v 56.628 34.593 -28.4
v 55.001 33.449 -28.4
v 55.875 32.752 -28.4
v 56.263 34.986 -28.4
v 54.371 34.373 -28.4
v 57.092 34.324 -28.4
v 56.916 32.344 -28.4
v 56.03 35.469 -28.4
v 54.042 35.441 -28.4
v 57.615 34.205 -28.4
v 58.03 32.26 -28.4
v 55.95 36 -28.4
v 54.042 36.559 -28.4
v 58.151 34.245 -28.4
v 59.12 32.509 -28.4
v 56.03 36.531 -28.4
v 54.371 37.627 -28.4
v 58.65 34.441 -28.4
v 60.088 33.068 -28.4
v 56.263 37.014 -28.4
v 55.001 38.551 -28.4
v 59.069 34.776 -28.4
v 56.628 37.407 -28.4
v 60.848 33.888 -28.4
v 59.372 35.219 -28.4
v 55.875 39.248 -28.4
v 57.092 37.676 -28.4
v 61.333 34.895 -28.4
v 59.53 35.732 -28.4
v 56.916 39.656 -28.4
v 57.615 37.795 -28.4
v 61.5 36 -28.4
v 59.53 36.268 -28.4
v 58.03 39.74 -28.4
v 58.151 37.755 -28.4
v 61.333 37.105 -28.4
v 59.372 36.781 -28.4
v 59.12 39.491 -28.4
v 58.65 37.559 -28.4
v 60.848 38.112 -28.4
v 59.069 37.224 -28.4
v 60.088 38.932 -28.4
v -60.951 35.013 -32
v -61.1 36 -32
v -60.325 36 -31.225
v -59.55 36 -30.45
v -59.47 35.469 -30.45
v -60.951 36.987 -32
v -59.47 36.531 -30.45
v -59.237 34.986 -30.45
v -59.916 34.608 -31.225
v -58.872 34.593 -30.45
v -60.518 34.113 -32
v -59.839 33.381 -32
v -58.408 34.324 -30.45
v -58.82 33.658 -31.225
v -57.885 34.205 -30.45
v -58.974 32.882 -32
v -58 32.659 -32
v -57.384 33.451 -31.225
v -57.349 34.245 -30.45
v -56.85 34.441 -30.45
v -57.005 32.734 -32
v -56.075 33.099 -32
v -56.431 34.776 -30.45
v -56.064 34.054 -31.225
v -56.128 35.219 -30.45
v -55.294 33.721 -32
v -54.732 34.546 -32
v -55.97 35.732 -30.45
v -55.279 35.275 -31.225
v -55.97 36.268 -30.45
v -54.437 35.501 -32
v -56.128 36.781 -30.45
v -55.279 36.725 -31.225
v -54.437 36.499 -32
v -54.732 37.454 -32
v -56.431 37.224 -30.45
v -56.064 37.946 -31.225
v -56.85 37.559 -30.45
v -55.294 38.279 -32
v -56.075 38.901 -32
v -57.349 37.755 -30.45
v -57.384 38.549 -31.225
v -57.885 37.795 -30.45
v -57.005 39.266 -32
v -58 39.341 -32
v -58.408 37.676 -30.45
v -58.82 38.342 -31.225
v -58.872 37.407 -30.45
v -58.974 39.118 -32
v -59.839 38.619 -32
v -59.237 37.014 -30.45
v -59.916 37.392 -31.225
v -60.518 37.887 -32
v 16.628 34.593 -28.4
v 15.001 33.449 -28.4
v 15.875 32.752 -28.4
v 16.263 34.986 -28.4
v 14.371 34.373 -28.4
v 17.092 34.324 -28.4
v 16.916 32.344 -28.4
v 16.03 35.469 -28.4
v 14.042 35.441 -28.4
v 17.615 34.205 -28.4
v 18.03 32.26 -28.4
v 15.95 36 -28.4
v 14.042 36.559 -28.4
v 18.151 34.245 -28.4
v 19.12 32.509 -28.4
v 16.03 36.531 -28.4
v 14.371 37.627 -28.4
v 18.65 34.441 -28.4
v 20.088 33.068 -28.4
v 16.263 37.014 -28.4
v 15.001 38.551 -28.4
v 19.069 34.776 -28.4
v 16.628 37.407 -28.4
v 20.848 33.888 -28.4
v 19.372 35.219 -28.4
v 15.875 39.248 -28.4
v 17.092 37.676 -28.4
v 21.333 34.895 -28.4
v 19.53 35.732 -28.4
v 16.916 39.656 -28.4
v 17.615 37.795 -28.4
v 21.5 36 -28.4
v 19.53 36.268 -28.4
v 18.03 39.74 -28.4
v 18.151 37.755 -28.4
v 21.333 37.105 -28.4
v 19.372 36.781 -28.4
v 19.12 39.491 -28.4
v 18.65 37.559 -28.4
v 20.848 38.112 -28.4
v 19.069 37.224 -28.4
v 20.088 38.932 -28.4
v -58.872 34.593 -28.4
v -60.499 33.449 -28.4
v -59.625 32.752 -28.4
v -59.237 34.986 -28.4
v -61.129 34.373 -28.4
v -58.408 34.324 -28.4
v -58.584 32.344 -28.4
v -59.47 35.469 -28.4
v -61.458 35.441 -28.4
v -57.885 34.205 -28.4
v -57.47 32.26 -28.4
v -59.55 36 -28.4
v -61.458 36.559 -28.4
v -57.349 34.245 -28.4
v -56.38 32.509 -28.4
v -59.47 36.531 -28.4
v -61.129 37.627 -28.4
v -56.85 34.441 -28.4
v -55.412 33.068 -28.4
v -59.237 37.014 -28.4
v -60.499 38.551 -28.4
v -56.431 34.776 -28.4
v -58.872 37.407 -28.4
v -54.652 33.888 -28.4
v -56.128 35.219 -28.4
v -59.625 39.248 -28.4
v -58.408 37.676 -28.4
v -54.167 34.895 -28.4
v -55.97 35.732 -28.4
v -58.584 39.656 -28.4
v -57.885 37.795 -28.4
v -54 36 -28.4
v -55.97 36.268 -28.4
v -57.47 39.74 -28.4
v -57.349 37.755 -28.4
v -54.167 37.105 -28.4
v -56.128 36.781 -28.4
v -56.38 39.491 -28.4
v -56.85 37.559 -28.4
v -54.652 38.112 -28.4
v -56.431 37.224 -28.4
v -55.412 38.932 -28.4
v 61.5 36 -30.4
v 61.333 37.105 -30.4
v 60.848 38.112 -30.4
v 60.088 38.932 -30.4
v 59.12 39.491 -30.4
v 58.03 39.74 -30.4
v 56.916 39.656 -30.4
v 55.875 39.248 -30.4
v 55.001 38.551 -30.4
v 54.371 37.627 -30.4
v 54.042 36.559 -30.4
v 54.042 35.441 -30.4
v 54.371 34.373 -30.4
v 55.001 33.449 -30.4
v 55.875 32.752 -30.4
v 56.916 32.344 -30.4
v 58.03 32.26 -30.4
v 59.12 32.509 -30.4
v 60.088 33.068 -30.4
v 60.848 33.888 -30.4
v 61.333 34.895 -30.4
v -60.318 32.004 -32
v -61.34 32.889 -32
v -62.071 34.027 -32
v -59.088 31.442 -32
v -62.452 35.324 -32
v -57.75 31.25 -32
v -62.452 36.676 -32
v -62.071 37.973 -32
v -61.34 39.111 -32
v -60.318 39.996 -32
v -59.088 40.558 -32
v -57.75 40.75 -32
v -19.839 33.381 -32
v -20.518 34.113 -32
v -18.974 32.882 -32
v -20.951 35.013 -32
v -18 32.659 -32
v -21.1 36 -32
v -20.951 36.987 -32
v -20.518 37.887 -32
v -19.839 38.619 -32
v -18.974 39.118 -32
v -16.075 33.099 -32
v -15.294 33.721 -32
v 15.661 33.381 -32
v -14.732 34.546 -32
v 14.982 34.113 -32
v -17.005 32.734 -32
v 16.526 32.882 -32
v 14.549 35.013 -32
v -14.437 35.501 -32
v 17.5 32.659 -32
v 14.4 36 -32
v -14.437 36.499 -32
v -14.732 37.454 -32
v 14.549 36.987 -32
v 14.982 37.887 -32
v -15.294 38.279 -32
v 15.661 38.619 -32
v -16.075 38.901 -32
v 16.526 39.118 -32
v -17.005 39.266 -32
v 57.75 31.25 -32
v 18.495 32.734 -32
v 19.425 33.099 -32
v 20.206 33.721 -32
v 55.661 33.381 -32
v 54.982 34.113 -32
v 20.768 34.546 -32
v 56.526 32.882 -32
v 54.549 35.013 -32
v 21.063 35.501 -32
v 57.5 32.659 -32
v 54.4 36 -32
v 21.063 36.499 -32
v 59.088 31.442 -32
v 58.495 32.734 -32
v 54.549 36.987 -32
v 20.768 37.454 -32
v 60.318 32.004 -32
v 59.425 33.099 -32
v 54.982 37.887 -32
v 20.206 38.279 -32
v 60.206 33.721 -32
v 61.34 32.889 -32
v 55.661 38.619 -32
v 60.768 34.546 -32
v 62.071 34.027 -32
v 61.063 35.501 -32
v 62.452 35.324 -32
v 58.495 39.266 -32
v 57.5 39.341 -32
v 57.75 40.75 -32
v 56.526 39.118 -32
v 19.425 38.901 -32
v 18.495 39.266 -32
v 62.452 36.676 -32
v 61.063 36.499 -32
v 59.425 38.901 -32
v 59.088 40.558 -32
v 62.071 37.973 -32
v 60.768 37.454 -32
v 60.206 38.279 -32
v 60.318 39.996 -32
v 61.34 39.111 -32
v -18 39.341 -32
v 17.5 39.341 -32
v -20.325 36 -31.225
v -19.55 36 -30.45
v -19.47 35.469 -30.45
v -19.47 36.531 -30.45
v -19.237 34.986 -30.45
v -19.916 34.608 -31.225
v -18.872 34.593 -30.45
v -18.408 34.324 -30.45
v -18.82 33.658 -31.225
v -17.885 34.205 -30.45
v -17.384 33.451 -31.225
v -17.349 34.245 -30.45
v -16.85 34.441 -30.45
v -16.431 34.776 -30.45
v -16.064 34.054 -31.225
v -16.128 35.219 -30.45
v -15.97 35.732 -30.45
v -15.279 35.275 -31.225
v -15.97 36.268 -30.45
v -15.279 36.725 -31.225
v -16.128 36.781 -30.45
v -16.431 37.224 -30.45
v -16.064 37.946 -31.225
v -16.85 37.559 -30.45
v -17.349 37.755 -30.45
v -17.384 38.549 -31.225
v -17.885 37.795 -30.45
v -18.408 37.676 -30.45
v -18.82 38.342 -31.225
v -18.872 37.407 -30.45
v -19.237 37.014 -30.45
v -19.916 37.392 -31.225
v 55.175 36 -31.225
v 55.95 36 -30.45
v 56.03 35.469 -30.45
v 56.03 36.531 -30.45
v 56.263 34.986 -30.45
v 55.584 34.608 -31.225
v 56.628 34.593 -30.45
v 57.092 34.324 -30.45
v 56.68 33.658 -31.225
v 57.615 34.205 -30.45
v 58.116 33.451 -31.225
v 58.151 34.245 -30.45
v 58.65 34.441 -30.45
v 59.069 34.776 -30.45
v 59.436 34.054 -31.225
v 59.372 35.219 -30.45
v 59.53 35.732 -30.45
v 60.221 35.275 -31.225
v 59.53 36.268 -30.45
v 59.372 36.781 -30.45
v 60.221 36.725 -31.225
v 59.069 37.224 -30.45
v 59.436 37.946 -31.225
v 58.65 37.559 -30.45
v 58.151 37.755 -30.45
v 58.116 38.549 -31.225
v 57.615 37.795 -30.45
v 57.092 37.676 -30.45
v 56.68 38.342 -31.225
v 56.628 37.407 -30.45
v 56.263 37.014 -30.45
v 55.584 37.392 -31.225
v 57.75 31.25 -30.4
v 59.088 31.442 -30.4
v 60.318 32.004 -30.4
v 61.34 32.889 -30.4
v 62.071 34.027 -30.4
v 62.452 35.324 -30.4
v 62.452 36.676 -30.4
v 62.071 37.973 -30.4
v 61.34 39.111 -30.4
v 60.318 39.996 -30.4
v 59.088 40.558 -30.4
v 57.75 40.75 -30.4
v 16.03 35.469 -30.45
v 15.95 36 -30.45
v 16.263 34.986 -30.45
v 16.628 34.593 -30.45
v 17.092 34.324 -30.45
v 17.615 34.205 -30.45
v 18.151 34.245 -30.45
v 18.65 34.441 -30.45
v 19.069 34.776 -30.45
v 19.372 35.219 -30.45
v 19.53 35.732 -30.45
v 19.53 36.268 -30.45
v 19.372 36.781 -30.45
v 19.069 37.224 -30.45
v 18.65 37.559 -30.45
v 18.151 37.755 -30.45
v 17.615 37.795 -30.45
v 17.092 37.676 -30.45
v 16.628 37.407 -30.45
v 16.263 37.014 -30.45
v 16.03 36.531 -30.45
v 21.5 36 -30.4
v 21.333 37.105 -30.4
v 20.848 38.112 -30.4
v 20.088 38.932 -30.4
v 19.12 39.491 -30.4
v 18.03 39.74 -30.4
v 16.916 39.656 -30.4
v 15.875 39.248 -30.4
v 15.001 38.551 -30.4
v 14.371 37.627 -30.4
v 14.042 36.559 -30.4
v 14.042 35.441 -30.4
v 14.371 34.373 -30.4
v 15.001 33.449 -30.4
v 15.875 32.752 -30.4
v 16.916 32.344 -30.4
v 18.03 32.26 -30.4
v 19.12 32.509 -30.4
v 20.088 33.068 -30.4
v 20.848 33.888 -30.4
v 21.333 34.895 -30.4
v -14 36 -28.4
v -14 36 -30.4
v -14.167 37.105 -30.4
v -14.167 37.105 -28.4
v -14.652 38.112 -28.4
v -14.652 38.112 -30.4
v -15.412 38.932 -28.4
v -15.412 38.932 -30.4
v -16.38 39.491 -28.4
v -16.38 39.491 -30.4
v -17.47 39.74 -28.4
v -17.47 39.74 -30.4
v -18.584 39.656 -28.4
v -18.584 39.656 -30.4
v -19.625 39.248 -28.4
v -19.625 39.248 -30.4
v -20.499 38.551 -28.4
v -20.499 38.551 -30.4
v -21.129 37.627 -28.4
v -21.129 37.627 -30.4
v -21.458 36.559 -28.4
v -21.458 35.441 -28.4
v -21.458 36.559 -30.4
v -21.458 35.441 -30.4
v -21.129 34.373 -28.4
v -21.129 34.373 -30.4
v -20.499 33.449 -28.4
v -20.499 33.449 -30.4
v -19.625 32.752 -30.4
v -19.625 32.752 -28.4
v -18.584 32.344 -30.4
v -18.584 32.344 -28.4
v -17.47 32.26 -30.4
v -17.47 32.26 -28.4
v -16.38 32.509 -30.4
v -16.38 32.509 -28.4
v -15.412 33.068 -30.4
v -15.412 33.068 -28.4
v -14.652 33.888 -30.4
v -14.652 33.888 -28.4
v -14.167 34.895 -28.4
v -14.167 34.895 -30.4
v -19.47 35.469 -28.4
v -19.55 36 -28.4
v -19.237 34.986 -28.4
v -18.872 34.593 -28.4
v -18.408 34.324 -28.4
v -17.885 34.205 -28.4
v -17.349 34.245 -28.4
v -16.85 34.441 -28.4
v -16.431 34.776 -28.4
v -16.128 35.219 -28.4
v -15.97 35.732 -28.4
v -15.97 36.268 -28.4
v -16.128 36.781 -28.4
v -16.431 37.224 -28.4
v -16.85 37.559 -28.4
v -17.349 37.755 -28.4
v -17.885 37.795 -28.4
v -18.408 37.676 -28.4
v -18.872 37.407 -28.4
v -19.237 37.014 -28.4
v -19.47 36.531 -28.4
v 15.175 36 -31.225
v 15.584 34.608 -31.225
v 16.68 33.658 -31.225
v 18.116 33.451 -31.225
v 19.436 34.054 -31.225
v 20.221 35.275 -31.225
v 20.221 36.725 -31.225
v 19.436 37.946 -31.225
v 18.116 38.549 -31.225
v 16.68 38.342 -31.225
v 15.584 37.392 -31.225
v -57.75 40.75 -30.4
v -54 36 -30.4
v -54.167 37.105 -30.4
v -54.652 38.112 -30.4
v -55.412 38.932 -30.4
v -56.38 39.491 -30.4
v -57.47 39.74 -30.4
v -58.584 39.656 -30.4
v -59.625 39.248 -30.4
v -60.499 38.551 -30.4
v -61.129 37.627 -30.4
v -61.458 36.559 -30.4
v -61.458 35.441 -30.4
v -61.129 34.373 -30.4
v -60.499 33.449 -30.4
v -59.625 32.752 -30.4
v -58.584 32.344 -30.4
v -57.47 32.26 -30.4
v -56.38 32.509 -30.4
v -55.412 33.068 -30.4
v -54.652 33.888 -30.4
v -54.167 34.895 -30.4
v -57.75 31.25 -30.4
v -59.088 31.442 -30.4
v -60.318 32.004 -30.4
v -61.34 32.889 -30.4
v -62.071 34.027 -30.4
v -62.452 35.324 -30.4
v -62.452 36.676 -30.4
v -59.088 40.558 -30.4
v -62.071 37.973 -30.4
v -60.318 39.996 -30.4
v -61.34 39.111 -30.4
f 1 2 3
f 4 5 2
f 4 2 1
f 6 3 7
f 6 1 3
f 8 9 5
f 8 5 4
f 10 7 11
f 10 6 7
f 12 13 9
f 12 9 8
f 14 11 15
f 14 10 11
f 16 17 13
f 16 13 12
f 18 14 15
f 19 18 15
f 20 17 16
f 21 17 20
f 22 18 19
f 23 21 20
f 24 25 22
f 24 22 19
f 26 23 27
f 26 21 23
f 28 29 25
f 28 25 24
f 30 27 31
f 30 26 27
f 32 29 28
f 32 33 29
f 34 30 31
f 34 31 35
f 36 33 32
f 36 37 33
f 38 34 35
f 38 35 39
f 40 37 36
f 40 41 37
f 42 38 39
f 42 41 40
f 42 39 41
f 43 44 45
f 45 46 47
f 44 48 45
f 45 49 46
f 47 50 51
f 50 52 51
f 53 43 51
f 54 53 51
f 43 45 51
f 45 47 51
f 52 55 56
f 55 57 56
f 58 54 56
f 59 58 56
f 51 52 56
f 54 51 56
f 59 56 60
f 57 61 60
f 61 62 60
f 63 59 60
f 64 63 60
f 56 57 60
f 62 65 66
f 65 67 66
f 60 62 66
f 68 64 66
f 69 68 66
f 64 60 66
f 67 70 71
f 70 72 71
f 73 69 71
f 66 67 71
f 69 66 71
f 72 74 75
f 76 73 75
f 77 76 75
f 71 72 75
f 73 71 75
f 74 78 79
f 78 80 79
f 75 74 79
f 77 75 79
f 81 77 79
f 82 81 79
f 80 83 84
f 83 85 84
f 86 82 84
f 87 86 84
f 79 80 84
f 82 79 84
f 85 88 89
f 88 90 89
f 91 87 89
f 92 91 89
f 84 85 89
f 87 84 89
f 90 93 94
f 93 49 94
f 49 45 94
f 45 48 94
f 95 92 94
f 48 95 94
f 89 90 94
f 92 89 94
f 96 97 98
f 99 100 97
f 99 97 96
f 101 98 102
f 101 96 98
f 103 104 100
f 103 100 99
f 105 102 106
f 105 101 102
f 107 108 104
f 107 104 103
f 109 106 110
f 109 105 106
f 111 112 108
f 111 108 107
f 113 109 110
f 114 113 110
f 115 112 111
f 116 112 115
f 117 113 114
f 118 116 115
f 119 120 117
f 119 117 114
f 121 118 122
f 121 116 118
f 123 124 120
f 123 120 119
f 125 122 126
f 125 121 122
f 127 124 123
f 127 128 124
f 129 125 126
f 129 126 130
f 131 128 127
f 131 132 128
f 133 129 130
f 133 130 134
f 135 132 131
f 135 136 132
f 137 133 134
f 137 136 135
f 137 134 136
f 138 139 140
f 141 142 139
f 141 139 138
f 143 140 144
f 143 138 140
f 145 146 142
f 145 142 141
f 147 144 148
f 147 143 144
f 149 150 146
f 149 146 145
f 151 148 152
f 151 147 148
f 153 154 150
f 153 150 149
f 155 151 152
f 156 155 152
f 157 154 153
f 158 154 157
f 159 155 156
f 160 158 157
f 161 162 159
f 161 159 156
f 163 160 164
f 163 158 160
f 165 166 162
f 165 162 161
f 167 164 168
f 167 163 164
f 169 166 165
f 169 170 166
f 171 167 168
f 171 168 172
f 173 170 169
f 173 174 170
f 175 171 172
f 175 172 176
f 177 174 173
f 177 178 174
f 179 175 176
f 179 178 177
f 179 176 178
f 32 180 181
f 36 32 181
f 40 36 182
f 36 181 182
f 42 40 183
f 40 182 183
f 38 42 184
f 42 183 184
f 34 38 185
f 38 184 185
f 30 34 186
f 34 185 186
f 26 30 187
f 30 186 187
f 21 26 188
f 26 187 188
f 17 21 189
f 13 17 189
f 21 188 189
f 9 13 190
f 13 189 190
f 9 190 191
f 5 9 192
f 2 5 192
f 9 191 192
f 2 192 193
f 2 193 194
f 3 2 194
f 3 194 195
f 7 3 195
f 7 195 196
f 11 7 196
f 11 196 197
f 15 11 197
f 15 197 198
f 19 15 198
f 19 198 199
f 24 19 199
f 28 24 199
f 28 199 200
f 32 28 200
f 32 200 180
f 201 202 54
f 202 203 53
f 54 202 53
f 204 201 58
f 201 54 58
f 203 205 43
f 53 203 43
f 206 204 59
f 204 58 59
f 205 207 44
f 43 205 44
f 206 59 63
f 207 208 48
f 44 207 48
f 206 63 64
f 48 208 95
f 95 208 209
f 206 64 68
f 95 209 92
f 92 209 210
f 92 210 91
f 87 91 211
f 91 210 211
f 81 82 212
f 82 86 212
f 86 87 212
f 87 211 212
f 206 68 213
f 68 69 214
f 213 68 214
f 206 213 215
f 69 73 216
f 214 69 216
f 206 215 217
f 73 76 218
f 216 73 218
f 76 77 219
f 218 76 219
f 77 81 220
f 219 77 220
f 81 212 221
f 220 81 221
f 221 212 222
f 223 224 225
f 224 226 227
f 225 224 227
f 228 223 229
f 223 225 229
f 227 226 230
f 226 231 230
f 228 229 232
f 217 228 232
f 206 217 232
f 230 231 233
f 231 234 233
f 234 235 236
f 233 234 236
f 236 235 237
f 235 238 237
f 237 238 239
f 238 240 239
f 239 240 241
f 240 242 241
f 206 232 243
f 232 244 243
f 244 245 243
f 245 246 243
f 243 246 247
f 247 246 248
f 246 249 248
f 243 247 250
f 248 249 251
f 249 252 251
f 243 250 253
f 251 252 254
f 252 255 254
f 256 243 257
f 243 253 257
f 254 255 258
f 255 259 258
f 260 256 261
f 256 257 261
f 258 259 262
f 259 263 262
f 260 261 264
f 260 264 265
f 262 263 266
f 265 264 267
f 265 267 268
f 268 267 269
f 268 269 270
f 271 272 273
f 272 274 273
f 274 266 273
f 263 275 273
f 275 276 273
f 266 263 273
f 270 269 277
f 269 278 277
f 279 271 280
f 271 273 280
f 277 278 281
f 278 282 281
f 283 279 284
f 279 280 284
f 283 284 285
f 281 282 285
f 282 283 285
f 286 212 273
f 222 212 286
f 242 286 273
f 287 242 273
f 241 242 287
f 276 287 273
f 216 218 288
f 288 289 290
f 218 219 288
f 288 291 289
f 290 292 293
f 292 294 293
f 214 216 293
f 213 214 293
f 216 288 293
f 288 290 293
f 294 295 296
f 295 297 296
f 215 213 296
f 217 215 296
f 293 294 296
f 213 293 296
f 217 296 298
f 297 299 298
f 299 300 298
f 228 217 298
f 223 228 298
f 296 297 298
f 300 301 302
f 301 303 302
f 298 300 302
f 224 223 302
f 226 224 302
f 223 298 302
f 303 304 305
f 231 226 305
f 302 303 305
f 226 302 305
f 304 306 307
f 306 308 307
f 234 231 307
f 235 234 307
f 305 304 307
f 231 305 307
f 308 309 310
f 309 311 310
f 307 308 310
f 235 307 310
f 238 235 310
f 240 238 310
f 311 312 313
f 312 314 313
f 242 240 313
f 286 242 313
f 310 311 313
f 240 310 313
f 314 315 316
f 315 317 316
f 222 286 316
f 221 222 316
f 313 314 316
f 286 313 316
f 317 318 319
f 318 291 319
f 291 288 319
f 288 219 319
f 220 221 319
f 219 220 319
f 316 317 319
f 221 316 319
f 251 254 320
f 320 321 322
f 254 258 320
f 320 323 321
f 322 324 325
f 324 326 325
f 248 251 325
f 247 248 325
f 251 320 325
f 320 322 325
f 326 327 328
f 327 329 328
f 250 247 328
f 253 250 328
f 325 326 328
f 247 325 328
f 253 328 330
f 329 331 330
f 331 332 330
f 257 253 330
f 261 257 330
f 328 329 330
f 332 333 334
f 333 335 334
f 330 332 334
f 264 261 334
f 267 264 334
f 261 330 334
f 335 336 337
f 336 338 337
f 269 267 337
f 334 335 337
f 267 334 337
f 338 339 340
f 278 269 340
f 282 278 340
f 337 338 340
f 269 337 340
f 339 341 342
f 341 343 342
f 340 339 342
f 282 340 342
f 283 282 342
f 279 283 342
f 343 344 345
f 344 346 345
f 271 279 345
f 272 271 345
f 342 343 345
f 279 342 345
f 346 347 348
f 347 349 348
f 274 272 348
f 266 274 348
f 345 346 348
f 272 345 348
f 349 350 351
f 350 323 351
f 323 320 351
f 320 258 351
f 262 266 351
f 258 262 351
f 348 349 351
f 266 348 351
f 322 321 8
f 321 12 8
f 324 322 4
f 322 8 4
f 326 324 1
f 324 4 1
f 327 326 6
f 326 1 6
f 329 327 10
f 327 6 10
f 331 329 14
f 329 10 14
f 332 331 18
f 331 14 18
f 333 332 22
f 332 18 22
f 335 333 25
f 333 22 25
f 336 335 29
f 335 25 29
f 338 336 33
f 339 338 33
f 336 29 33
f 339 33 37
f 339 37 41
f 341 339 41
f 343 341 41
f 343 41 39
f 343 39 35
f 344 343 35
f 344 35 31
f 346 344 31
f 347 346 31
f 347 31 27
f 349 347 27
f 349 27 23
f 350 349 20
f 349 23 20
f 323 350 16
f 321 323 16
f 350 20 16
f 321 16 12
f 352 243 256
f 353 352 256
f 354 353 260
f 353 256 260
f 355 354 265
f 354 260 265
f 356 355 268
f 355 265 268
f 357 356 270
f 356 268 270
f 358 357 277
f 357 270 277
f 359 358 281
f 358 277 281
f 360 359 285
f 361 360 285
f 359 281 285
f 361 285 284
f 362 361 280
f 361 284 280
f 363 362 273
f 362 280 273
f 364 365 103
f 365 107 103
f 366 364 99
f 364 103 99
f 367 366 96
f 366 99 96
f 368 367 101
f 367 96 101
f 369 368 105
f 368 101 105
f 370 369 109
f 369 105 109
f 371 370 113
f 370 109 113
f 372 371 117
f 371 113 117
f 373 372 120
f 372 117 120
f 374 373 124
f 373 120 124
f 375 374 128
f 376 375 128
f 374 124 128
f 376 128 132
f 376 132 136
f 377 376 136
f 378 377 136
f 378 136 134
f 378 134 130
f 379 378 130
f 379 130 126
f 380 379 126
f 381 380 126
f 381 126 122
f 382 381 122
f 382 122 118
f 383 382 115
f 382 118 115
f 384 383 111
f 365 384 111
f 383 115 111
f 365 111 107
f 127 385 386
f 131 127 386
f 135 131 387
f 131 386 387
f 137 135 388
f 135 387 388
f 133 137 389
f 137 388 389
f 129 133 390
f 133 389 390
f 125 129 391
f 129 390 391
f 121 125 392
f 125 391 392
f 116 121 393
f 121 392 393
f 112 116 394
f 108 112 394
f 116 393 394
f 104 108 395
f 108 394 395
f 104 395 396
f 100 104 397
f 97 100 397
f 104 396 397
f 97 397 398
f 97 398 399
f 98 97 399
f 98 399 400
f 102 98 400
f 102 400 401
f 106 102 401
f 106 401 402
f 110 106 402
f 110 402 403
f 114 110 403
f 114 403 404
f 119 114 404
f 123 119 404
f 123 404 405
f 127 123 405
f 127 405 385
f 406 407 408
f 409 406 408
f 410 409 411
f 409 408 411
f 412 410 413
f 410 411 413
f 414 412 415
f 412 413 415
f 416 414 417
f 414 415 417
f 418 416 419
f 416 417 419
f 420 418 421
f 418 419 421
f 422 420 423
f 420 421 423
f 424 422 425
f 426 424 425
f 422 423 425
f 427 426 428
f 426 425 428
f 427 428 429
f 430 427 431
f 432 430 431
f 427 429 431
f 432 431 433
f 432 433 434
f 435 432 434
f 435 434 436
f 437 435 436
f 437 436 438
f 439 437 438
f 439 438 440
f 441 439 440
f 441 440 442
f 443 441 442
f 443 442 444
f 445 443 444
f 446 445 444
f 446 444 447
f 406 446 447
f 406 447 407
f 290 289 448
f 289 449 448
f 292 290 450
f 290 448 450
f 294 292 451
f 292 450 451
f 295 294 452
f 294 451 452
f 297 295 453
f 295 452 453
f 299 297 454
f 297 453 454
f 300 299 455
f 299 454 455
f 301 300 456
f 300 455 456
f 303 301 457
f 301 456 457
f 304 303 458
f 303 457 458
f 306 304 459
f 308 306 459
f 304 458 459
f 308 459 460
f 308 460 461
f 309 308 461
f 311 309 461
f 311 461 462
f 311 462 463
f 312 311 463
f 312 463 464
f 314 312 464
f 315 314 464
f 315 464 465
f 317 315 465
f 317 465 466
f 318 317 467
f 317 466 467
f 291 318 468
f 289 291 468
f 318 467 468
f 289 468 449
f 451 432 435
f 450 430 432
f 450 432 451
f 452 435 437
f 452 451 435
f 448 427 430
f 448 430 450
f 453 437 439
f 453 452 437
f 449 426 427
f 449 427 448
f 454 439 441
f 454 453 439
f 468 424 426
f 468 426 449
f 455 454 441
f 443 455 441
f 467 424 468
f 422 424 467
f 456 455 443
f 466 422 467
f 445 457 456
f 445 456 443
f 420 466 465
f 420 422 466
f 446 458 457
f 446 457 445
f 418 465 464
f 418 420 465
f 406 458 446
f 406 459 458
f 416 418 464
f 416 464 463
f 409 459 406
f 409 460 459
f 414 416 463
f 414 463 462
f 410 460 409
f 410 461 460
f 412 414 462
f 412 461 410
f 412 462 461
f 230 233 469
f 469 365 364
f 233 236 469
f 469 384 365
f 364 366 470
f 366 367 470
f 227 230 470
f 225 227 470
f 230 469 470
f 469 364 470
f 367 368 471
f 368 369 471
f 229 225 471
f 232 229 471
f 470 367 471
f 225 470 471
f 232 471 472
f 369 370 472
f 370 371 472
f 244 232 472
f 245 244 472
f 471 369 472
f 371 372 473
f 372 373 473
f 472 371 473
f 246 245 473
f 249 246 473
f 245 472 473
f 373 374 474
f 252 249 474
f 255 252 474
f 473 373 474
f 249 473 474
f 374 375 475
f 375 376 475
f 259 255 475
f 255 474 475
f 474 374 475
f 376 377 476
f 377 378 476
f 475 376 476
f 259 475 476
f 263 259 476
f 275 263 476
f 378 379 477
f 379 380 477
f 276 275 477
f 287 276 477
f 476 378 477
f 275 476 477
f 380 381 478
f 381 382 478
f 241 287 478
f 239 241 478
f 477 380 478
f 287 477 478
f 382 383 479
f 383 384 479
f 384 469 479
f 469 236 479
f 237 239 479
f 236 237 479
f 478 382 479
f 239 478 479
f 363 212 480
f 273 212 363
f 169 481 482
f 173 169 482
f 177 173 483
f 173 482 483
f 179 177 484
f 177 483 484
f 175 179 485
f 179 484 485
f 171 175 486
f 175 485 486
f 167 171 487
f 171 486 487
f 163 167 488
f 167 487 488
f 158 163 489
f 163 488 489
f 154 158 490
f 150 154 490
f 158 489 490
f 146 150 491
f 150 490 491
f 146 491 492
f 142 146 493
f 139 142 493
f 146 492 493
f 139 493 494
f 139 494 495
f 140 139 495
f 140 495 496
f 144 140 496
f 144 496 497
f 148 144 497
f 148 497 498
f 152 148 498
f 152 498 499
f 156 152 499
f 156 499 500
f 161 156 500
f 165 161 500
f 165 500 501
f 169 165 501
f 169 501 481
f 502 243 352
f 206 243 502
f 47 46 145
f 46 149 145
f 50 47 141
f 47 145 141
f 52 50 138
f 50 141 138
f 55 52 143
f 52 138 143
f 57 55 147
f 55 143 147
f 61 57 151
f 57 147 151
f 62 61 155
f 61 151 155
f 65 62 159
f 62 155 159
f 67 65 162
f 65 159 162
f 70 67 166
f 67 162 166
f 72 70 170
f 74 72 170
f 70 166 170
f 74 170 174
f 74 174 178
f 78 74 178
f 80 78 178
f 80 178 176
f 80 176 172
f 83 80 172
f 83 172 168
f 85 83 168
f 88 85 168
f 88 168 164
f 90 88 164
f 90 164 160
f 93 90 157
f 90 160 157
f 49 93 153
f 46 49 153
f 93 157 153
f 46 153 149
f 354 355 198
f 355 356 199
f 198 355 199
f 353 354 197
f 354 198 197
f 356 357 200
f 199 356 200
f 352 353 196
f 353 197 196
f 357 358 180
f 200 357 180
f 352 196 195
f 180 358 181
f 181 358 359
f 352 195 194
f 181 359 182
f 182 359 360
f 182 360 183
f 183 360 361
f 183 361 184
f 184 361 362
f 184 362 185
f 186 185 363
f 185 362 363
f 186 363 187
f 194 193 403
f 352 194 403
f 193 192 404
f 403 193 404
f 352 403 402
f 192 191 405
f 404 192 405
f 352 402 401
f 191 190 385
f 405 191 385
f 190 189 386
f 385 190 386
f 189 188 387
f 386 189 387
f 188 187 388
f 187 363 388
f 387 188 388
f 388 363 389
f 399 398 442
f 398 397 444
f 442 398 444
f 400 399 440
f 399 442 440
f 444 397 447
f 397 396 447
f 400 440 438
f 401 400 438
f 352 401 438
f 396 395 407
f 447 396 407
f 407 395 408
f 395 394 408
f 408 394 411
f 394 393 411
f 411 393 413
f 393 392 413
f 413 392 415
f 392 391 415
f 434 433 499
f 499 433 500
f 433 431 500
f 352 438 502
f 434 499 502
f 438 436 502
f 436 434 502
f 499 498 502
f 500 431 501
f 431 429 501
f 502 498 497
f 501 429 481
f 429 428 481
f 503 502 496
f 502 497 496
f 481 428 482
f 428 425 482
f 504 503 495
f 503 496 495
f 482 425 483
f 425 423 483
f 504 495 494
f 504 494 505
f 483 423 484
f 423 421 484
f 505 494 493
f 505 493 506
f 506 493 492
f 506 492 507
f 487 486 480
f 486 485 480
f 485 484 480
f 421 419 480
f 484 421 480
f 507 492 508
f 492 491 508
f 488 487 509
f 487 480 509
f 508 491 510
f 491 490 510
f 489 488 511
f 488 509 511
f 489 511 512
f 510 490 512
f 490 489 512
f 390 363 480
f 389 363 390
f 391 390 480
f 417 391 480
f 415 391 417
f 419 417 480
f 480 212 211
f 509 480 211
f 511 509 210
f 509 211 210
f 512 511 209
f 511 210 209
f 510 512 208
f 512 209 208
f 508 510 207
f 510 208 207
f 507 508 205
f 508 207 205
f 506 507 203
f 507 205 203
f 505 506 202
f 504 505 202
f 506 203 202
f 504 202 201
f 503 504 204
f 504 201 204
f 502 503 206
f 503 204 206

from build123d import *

# Parameters (mm, degrees)
PAD003_DEPTH        = 1.6
SKETCH006_R         = 3.75
PAD004_DEPTH        = 3.6
HOLE001_D           = 3.6
HOLE001_DEPTH       = 25
HOLE001_CSINK_D     = 6.7
HOLE001_CSINK_ANGLE = 90


with BuildPart() as part:
    # Sketch005 → Pad003 (new body)
    with BuildSketch(Plane.XY):
        with BuildLine():
            Line((-57.75, 4.75), (57.75, 4.75))
            ThreePointArc((57.75, -4.75), (62.5, 0), (57.75, 4.75))
            Line((57.75, -4.75), (-57.75, -4.75))
            ThreePointArc((-57.75, 4.75), (-62.5, 0), (-57.75, -4.75))
        make_face()
    extrude(amount=PAD003_DEPTH)

    # Sketch006 → Pad004 (join)
    with BuildSketch(Plane.XY):
        with Locations((-57.75, 0)):
            Circle(SKETCH006_R)
        with Locations((-17.75, 0)):
            Circle(SKETCH006_R)
        with Locations((17.75, 0)):
            Circle(SKETCH006_R)
        with Locations((57.75, 0)):
            Circle(SKETCH006_R)
    extrude(amount=PAD004_DEPTH)

    # Hole001
    with Locations(Plane(origin=(0, 0, 0), x_dir=(1, 0, 0), z_dir=(0, 0, -1))):
        with Locations((-57.75, 0), (-17.75, 0), (17.75, 0), (57.75, 0)):
            CounterSinkHole(HOLE001_D / 2, HOLE001_CSINK_D / 2, depth=HOLE001_DEPTH, counter_sink_angle=HOLE001_CSINK_ANGLE)


with BuildPart() as part_1:
    # Body001 placement: moved
    add(part.part.moved(Location((0, 36, -32))))


solid = part_1.part
